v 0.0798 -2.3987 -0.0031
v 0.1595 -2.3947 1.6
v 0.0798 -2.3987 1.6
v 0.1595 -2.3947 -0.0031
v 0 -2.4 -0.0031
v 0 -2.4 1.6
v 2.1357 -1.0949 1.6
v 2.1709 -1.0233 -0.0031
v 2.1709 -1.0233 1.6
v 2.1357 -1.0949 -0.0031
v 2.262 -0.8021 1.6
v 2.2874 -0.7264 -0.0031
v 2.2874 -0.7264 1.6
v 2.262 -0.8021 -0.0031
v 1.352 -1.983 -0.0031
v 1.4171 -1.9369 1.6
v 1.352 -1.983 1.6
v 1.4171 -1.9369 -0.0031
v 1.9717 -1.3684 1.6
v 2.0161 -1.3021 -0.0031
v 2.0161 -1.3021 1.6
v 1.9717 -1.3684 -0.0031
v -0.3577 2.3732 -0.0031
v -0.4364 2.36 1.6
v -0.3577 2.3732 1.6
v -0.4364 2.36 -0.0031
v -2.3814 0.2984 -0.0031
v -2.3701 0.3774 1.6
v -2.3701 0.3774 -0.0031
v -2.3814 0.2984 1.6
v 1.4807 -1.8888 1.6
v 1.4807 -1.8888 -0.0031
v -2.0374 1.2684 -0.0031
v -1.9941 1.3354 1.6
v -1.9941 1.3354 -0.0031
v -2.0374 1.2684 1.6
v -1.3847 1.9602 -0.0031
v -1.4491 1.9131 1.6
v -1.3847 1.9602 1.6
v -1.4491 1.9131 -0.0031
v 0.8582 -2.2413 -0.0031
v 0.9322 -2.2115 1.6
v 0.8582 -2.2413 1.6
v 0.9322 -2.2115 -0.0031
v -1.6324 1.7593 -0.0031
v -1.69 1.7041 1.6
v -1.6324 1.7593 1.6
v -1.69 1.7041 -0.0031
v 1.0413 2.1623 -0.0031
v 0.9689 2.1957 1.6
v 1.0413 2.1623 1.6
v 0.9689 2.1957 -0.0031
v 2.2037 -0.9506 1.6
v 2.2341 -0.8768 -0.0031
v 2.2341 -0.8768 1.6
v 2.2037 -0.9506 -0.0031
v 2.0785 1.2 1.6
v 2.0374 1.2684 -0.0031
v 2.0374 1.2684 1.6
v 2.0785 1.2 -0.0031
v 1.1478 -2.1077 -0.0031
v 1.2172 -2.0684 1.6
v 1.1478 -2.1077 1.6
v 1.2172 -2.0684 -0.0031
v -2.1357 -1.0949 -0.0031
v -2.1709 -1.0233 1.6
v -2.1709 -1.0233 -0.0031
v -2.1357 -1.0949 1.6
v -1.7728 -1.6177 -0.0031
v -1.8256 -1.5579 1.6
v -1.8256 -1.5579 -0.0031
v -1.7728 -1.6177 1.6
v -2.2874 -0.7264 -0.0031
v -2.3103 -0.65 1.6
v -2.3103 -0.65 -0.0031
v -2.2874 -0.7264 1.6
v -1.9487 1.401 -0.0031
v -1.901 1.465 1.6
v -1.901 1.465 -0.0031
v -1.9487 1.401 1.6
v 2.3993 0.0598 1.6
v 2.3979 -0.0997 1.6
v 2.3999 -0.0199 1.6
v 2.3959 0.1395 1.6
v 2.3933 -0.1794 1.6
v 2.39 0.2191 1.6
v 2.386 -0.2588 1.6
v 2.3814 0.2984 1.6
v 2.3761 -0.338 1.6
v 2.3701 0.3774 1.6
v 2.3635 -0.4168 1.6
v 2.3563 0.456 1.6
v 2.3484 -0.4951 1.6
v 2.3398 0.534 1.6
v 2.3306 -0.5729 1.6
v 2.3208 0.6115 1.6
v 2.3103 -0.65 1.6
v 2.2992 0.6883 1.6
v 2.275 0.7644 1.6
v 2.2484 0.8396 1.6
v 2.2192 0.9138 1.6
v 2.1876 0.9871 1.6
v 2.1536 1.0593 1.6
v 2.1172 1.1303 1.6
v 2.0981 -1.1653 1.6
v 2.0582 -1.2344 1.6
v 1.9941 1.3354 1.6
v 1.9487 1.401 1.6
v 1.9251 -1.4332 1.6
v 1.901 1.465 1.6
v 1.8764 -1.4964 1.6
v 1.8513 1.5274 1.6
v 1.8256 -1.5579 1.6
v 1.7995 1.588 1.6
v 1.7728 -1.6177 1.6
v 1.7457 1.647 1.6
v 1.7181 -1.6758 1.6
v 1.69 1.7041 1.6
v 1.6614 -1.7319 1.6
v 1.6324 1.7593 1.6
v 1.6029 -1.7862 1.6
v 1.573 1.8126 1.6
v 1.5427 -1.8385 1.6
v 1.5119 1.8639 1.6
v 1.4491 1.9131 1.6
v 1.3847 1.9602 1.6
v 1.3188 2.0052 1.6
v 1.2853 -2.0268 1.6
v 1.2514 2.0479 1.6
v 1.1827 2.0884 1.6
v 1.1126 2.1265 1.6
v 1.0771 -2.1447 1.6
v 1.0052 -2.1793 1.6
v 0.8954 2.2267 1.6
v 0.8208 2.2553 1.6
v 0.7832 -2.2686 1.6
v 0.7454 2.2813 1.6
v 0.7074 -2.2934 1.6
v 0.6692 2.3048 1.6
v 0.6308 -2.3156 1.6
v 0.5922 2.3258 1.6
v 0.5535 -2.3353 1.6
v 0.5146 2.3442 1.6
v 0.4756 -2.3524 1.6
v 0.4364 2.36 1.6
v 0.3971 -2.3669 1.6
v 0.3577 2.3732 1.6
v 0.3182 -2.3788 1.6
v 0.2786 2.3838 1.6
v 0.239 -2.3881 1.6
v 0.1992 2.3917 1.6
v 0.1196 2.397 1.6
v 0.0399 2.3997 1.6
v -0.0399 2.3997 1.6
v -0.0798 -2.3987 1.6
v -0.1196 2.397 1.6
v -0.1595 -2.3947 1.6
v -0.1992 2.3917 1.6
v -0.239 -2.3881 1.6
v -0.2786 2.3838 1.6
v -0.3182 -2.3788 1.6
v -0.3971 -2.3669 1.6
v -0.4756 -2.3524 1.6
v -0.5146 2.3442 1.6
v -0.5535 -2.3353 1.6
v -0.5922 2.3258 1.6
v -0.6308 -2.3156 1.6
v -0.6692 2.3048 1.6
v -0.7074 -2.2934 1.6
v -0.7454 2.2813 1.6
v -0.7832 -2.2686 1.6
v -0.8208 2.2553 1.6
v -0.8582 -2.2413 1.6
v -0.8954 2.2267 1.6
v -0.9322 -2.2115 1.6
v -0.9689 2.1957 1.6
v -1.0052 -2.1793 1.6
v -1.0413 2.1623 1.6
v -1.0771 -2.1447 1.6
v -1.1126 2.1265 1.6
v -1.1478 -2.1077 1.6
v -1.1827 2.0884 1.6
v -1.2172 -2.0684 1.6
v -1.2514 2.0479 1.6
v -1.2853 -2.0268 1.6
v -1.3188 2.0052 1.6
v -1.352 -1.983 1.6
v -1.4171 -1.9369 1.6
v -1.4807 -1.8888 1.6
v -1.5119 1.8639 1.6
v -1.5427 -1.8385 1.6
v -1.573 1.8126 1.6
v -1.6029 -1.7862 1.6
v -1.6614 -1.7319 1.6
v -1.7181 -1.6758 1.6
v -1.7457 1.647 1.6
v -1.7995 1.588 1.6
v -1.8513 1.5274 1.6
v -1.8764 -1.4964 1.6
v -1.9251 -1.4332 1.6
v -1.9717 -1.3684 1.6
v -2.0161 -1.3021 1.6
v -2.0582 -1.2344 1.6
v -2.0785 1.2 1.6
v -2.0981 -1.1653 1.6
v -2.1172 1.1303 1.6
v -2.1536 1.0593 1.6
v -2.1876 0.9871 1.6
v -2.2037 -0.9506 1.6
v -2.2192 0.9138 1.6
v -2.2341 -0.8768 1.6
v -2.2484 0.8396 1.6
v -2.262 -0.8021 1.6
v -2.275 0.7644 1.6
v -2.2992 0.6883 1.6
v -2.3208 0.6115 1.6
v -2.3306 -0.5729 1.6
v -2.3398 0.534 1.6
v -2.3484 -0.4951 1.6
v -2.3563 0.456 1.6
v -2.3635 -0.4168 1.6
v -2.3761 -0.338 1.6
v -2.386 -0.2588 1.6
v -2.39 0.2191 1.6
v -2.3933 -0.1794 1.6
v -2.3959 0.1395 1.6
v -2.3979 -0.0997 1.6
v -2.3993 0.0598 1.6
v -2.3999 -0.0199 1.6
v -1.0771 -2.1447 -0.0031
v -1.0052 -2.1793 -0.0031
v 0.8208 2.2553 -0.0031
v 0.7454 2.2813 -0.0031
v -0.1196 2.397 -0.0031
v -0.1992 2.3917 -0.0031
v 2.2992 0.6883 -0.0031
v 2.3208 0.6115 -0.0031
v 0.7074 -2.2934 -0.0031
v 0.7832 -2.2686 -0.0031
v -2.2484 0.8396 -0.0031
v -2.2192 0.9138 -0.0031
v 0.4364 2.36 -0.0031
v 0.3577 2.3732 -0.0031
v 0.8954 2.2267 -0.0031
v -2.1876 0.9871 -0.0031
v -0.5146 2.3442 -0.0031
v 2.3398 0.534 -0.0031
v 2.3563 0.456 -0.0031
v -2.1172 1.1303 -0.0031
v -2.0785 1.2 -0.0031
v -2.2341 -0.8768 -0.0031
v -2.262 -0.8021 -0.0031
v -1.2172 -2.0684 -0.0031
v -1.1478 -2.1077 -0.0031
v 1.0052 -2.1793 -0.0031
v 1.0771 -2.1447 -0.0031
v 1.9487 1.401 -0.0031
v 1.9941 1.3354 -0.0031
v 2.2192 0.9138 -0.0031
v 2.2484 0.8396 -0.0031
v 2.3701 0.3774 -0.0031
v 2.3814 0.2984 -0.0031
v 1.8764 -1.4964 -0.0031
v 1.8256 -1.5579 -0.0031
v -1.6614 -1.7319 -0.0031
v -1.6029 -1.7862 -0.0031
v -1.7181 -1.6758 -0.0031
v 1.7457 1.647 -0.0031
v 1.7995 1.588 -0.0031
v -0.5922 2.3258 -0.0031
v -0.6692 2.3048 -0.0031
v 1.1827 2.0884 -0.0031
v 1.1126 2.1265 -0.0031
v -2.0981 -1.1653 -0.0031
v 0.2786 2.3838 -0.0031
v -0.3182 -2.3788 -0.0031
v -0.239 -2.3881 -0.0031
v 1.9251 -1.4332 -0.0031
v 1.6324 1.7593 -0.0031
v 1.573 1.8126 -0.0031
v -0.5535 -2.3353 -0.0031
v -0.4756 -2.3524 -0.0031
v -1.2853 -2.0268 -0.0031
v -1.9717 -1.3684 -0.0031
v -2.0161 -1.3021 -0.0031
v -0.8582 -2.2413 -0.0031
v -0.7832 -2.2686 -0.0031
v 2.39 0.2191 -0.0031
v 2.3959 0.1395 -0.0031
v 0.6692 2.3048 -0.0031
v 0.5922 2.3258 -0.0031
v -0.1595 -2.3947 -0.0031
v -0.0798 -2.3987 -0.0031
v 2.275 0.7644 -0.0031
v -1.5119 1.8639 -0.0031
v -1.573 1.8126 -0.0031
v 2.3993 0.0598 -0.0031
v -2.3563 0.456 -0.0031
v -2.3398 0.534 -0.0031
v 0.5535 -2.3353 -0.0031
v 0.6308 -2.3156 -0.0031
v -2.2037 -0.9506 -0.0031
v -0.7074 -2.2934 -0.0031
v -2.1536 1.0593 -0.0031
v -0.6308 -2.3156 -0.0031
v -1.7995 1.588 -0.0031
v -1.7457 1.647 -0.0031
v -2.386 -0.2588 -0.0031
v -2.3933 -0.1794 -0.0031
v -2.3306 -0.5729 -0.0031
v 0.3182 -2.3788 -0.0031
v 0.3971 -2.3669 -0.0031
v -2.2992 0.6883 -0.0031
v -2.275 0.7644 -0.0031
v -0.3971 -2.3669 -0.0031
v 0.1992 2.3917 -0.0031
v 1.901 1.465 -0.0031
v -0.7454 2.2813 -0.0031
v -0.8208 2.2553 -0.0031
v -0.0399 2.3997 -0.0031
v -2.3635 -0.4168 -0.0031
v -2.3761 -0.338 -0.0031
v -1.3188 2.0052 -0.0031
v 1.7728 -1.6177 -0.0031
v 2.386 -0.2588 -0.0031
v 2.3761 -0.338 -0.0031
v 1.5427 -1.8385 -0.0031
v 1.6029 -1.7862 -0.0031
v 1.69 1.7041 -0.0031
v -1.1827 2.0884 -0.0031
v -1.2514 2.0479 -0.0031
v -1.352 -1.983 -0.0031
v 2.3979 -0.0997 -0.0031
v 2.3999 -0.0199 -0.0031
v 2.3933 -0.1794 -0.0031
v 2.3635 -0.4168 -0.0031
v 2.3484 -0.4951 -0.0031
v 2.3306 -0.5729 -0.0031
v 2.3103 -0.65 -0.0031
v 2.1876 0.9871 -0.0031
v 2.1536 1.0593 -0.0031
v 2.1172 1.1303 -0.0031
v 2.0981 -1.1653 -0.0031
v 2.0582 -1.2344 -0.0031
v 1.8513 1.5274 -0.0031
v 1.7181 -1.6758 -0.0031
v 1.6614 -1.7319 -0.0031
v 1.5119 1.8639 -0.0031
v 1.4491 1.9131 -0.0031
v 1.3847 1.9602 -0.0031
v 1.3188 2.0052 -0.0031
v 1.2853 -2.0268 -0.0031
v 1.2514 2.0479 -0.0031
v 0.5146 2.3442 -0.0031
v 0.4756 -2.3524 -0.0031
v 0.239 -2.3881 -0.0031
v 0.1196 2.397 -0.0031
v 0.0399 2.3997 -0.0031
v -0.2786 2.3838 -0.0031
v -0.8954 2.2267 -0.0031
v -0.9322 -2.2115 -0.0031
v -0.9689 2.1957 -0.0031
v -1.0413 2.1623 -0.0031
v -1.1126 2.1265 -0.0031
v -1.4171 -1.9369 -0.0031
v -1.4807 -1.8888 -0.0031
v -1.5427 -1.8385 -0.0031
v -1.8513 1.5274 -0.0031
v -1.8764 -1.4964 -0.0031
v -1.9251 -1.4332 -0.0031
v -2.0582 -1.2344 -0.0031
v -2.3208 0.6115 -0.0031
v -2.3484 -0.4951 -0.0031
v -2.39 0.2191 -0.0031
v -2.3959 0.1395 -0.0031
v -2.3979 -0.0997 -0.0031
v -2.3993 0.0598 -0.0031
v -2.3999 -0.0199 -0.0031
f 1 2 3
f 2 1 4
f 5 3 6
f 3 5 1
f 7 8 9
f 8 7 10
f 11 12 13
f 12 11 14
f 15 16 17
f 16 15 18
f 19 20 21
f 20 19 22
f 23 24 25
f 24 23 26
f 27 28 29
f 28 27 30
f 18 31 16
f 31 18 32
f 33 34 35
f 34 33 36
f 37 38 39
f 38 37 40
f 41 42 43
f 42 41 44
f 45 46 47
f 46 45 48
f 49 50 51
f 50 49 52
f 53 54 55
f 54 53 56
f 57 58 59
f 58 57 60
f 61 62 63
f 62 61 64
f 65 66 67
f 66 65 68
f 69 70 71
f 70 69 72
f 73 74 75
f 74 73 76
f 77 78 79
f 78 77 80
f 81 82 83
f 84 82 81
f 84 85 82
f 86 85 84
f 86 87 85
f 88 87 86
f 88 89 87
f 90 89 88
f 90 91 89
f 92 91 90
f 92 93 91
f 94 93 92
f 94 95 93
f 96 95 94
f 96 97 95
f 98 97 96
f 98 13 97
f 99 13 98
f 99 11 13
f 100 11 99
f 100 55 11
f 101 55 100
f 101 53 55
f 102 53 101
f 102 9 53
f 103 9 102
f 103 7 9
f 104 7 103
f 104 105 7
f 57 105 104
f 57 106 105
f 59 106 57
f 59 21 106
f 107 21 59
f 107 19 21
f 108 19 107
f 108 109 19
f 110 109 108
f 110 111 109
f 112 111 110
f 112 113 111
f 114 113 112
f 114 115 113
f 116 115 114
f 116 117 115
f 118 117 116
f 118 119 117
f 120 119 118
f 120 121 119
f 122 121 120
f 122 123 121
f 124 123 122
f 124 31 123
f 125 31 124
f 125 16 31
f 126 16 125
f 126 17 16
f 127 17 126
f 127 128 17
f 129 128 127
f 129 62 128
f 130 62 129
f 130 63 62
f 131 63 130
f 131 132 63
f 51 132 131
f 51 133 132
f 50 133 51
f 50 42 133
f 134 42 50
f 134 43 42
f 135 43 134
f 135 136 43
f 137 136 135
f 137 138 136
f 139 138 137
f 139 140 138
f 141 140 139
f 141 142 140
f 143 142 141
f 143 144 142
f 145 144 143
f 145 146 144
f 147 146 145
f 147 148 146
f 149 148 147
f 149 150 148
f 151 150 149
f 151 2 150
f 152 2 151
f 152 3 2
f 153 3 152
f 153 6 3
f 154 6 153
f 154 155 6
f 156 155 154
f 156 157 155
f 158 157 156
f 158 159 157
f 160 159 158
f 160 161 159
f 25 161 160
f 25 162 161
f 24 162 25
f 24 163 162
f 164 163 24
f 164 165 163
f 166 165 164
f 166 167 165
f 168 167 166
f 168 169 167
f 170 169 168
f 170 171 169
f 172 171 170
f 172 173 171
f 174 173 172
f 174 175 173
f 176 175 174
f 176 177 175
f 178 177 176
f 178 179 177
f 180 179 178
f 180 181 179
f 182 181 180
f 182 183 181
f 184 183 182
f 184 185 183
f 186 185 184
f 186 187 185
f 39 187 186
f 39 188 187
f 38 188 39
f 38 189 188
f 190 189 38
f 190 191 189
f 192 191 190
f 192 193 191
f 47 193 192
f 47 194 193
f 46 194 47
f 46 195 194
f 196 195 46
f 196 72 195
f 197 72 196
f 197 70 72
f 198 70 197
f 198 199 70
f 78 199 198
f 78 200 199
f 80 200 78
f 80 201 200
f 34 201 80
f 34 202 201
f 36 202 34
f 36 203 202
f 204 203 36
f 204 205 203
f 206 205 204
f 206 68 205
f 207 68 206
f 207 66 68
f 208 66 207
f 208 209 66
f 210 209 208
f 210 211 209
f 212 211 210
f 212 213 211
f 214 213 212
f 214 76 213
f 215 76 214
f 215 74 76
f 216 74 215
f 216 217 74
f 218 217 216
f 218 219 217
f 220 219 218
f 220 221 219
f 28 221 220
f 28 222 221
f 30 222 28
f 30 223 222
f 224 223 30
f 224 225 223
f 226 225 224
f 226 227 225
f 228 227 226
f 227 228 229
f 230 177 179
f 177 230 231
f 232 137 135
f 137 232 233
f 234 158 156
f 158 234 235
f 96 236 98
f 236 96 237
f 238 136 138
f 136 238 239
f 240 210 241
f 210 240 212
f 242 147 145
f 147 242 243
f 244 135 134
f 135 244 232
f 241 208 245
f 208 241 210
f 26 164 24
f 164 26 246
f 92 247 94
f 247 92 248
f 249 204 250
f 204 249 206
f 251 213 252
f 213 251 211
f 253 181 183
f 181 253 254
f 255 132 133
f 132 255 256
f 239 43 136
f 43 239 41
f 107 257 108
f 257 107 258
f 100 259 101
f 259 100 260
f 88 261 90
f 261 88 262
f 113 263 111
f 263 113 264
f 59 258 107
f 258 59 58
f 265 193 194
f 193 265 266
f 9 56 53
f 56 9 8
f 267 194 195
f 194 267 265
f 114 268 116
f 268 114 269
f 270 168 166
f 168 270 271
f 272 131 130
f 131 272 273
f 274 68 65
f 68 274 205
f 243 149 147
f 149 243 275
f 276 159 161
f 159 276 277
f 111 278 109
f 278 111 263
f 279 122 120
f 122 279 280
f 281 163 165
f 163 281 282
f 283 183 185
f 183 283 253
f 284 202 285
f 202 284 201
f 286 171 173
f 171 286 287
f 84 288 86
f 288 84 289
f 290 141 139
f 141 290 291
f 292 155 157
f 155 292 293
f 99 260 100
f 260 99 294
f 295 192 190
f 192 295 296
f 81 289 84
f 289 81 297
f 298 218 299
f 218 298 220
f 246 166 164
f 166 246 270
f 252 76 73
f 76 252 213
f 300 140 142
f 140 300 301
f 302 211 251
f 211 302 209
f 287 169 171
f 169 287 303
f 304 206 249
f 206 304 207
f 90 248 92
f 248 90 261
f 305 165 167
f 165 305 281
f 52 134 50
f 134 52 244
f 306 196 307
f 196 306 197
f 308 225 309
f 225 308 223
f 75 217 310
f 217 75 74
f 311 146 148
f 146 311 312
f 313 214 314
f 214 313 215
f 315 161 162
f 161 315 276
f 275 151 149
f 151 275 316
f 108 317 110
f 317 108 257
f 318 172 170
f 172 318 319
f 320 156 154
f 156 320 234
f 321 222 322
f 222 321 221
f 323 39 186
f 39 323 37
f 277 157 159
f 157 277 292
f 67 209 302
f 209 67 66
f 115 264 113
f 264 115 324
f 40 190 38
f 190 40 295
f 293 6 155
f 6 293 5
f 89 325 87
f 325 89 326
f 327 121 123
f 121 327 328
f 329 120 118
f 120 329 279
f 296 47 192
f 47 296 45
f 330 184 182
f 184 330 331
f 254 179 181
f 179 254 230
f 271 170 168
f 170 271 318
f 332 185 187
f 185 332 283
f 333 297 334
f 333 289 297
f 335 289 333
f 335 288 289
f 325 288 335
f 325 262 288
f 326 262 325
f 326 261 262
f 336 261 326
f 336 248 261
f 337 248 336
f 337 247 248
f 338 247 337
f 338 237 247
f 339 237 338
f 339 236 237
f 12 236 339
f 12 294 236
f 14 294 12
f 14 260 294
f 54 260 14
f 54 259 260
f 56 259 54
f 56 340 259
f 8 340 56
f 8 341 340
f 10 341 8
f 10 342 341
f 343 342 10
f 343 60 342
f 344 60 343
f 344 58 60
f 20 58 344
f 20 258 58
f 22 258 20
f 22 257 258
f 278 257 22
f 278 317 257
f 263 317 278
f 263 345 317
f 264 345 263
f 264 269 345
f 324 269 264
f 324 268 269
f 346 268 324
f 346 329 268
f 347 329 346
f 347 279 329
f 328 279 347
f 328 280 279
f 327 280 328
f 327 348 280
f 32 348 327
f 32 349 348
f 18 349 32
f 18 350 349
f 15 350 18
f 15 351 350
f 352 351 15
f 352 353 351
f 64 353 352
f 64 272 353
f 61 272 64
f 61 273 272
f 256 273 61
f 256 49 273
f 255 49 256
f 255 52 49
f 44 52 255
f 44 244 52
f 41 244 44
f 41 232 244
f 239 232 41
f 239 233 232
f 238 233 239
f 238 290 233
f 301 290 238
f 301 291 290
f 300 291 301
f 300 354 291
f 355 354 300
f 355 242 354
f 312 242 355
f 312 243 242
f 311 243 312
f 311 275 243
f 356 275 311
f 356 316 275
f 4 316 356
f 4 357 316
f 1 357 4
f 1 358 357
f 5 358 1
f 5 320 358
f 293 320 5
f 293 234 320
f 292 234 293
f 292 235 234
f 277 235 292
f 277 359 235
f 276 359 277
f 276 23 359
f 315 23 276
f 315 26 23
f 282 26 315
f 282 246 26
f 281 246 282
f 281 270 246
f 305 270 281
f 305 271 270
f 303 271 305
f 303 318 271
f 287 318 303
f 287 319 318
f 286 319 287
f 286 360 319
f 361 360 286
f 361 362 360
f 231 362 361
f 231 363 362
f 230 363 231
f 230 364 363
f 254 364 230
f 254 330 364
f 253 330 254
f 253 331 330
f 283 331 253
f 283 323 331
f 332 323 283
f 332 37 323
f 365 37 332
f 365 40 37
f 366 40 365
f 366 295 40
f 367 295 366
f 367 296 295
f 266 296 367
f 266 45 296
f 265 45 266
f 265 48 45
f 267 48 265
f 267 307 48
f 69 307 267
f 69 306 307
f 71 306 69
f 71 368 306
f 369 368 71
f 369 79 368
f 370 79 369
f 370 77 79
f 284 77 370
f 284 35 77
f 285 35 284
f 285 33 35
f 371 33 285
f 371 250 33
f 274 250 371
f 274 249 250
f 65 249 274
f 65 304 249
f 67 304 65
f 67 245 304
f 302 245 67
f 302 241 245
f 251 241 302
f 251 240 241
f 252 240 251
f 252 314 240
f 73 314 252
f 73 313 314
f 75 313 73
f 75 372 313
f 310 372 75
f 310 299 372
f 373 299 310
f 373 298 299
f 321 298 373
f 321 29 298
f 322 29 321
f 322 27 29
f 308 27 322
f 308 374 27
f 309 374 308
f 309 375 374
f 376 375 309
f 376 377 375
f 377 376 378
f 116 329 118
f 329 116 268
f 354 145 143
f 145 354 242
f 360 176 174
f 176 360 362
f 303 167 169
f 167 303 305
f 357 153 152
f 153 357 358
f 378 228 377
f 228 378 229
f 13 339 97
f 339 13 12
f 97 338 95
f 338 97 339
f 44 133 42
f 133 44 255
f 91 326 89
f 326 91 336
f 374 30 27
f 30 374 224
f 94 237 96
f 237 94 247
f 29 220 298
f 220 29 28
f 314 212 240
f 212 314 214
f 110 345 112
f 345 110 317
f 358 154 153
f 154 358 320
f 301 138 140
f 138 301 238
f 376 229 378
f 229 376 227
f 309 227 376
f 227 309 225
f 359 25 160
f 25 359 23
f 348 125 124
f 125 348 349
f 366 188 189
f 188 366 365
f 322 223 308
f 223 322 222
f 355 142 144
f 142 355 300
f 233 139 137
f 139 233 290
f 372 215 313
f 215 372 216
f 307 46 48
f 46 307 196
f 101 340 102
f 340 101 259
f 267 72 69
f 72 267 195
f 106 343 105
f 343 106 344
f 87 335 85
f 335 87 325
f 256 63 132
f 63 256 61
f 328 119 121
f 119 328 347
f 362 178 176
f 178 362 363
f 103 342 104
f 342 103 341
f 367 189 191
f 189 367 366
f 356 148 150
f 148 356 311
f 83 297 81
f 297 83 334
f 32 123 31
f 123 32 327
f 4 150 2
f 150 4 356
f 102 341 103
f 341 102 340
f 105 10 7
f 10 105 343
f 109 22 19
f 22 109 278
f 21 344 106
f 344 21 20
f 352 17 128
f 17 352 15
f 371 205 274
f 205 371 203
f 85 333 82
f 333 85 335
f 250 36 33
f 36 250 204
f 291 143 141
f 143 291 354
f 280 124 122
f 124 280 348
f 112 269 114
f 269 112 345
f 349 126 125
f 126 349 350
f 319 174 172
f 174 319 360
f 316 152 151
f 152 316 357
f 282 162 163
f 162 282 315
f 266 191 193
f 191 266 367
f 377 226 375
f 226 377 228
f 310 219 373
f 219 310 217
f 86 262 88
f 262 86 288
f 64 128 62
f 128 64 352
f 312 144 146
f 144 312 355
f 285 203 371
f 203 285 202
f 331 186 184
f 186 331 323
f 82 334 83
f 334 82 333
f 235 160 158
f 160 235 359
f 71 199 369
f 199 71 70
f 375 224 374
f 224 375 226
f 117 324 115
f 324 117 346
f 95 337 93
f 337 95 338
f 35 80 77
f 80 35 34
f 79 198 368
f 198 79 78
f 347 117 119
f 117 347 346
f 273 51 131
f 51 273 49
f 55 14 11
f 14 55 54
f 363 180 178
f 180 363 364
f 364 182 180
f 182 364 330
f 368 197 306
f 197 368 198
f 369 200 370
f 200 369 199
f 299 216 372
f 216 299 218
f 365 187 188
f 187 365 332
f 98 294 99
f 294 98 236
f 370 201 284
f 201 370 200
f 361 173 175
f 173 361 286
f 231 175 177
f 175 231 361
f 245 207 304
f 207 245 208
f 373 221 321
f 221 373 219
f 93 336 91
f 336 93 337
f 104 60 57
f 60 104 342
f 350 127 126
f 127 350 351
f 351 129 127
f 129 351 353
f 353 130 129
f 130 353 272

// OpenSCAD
use <../lib.scad>
use <3192a.scad>
$fa=1; $fs=0.2;
function ldraw_lib__446(realsolid=false) = [
// 0 ~Moved to 3192a
// 0 Name: 446.dat
// 0 Author: [PTadmin]
// 0 !LDRAW_ORG Part UPDATE 2010-02
// 0 !LICENSE Licensed under CC BY 4.0 : see CAreadme.txt
// 
// 0 BFC CERTIFY CCW
  [0,"BFC","CERTIFY"],
  [0,"BFC","CCW"],
// 
// 0 !HISTORY 2010-07-05 [PTadmin] Official Update 2010-02
// 
// 
// 0 // Door 1 x 3 x 4 Right
// 1 16 0 0 0 1 0 0 0 1 0 0 0 1 3192a.dat
  [1,16,0,0,0,1,0,0,0,1,0,0,0,1, ldraw_lib__3192a(realsolid)],
];
module ldraw_lib__446(step=0, col=false, unit=2/5, alt=false, line=0.2, solid=!$preview)
    makepoly(ldraw_lib__446(solid), step=step, col=col, unit=unit, alt=alt, line=line, solid=solid);
ldraw_lib__446(line=0.2);
